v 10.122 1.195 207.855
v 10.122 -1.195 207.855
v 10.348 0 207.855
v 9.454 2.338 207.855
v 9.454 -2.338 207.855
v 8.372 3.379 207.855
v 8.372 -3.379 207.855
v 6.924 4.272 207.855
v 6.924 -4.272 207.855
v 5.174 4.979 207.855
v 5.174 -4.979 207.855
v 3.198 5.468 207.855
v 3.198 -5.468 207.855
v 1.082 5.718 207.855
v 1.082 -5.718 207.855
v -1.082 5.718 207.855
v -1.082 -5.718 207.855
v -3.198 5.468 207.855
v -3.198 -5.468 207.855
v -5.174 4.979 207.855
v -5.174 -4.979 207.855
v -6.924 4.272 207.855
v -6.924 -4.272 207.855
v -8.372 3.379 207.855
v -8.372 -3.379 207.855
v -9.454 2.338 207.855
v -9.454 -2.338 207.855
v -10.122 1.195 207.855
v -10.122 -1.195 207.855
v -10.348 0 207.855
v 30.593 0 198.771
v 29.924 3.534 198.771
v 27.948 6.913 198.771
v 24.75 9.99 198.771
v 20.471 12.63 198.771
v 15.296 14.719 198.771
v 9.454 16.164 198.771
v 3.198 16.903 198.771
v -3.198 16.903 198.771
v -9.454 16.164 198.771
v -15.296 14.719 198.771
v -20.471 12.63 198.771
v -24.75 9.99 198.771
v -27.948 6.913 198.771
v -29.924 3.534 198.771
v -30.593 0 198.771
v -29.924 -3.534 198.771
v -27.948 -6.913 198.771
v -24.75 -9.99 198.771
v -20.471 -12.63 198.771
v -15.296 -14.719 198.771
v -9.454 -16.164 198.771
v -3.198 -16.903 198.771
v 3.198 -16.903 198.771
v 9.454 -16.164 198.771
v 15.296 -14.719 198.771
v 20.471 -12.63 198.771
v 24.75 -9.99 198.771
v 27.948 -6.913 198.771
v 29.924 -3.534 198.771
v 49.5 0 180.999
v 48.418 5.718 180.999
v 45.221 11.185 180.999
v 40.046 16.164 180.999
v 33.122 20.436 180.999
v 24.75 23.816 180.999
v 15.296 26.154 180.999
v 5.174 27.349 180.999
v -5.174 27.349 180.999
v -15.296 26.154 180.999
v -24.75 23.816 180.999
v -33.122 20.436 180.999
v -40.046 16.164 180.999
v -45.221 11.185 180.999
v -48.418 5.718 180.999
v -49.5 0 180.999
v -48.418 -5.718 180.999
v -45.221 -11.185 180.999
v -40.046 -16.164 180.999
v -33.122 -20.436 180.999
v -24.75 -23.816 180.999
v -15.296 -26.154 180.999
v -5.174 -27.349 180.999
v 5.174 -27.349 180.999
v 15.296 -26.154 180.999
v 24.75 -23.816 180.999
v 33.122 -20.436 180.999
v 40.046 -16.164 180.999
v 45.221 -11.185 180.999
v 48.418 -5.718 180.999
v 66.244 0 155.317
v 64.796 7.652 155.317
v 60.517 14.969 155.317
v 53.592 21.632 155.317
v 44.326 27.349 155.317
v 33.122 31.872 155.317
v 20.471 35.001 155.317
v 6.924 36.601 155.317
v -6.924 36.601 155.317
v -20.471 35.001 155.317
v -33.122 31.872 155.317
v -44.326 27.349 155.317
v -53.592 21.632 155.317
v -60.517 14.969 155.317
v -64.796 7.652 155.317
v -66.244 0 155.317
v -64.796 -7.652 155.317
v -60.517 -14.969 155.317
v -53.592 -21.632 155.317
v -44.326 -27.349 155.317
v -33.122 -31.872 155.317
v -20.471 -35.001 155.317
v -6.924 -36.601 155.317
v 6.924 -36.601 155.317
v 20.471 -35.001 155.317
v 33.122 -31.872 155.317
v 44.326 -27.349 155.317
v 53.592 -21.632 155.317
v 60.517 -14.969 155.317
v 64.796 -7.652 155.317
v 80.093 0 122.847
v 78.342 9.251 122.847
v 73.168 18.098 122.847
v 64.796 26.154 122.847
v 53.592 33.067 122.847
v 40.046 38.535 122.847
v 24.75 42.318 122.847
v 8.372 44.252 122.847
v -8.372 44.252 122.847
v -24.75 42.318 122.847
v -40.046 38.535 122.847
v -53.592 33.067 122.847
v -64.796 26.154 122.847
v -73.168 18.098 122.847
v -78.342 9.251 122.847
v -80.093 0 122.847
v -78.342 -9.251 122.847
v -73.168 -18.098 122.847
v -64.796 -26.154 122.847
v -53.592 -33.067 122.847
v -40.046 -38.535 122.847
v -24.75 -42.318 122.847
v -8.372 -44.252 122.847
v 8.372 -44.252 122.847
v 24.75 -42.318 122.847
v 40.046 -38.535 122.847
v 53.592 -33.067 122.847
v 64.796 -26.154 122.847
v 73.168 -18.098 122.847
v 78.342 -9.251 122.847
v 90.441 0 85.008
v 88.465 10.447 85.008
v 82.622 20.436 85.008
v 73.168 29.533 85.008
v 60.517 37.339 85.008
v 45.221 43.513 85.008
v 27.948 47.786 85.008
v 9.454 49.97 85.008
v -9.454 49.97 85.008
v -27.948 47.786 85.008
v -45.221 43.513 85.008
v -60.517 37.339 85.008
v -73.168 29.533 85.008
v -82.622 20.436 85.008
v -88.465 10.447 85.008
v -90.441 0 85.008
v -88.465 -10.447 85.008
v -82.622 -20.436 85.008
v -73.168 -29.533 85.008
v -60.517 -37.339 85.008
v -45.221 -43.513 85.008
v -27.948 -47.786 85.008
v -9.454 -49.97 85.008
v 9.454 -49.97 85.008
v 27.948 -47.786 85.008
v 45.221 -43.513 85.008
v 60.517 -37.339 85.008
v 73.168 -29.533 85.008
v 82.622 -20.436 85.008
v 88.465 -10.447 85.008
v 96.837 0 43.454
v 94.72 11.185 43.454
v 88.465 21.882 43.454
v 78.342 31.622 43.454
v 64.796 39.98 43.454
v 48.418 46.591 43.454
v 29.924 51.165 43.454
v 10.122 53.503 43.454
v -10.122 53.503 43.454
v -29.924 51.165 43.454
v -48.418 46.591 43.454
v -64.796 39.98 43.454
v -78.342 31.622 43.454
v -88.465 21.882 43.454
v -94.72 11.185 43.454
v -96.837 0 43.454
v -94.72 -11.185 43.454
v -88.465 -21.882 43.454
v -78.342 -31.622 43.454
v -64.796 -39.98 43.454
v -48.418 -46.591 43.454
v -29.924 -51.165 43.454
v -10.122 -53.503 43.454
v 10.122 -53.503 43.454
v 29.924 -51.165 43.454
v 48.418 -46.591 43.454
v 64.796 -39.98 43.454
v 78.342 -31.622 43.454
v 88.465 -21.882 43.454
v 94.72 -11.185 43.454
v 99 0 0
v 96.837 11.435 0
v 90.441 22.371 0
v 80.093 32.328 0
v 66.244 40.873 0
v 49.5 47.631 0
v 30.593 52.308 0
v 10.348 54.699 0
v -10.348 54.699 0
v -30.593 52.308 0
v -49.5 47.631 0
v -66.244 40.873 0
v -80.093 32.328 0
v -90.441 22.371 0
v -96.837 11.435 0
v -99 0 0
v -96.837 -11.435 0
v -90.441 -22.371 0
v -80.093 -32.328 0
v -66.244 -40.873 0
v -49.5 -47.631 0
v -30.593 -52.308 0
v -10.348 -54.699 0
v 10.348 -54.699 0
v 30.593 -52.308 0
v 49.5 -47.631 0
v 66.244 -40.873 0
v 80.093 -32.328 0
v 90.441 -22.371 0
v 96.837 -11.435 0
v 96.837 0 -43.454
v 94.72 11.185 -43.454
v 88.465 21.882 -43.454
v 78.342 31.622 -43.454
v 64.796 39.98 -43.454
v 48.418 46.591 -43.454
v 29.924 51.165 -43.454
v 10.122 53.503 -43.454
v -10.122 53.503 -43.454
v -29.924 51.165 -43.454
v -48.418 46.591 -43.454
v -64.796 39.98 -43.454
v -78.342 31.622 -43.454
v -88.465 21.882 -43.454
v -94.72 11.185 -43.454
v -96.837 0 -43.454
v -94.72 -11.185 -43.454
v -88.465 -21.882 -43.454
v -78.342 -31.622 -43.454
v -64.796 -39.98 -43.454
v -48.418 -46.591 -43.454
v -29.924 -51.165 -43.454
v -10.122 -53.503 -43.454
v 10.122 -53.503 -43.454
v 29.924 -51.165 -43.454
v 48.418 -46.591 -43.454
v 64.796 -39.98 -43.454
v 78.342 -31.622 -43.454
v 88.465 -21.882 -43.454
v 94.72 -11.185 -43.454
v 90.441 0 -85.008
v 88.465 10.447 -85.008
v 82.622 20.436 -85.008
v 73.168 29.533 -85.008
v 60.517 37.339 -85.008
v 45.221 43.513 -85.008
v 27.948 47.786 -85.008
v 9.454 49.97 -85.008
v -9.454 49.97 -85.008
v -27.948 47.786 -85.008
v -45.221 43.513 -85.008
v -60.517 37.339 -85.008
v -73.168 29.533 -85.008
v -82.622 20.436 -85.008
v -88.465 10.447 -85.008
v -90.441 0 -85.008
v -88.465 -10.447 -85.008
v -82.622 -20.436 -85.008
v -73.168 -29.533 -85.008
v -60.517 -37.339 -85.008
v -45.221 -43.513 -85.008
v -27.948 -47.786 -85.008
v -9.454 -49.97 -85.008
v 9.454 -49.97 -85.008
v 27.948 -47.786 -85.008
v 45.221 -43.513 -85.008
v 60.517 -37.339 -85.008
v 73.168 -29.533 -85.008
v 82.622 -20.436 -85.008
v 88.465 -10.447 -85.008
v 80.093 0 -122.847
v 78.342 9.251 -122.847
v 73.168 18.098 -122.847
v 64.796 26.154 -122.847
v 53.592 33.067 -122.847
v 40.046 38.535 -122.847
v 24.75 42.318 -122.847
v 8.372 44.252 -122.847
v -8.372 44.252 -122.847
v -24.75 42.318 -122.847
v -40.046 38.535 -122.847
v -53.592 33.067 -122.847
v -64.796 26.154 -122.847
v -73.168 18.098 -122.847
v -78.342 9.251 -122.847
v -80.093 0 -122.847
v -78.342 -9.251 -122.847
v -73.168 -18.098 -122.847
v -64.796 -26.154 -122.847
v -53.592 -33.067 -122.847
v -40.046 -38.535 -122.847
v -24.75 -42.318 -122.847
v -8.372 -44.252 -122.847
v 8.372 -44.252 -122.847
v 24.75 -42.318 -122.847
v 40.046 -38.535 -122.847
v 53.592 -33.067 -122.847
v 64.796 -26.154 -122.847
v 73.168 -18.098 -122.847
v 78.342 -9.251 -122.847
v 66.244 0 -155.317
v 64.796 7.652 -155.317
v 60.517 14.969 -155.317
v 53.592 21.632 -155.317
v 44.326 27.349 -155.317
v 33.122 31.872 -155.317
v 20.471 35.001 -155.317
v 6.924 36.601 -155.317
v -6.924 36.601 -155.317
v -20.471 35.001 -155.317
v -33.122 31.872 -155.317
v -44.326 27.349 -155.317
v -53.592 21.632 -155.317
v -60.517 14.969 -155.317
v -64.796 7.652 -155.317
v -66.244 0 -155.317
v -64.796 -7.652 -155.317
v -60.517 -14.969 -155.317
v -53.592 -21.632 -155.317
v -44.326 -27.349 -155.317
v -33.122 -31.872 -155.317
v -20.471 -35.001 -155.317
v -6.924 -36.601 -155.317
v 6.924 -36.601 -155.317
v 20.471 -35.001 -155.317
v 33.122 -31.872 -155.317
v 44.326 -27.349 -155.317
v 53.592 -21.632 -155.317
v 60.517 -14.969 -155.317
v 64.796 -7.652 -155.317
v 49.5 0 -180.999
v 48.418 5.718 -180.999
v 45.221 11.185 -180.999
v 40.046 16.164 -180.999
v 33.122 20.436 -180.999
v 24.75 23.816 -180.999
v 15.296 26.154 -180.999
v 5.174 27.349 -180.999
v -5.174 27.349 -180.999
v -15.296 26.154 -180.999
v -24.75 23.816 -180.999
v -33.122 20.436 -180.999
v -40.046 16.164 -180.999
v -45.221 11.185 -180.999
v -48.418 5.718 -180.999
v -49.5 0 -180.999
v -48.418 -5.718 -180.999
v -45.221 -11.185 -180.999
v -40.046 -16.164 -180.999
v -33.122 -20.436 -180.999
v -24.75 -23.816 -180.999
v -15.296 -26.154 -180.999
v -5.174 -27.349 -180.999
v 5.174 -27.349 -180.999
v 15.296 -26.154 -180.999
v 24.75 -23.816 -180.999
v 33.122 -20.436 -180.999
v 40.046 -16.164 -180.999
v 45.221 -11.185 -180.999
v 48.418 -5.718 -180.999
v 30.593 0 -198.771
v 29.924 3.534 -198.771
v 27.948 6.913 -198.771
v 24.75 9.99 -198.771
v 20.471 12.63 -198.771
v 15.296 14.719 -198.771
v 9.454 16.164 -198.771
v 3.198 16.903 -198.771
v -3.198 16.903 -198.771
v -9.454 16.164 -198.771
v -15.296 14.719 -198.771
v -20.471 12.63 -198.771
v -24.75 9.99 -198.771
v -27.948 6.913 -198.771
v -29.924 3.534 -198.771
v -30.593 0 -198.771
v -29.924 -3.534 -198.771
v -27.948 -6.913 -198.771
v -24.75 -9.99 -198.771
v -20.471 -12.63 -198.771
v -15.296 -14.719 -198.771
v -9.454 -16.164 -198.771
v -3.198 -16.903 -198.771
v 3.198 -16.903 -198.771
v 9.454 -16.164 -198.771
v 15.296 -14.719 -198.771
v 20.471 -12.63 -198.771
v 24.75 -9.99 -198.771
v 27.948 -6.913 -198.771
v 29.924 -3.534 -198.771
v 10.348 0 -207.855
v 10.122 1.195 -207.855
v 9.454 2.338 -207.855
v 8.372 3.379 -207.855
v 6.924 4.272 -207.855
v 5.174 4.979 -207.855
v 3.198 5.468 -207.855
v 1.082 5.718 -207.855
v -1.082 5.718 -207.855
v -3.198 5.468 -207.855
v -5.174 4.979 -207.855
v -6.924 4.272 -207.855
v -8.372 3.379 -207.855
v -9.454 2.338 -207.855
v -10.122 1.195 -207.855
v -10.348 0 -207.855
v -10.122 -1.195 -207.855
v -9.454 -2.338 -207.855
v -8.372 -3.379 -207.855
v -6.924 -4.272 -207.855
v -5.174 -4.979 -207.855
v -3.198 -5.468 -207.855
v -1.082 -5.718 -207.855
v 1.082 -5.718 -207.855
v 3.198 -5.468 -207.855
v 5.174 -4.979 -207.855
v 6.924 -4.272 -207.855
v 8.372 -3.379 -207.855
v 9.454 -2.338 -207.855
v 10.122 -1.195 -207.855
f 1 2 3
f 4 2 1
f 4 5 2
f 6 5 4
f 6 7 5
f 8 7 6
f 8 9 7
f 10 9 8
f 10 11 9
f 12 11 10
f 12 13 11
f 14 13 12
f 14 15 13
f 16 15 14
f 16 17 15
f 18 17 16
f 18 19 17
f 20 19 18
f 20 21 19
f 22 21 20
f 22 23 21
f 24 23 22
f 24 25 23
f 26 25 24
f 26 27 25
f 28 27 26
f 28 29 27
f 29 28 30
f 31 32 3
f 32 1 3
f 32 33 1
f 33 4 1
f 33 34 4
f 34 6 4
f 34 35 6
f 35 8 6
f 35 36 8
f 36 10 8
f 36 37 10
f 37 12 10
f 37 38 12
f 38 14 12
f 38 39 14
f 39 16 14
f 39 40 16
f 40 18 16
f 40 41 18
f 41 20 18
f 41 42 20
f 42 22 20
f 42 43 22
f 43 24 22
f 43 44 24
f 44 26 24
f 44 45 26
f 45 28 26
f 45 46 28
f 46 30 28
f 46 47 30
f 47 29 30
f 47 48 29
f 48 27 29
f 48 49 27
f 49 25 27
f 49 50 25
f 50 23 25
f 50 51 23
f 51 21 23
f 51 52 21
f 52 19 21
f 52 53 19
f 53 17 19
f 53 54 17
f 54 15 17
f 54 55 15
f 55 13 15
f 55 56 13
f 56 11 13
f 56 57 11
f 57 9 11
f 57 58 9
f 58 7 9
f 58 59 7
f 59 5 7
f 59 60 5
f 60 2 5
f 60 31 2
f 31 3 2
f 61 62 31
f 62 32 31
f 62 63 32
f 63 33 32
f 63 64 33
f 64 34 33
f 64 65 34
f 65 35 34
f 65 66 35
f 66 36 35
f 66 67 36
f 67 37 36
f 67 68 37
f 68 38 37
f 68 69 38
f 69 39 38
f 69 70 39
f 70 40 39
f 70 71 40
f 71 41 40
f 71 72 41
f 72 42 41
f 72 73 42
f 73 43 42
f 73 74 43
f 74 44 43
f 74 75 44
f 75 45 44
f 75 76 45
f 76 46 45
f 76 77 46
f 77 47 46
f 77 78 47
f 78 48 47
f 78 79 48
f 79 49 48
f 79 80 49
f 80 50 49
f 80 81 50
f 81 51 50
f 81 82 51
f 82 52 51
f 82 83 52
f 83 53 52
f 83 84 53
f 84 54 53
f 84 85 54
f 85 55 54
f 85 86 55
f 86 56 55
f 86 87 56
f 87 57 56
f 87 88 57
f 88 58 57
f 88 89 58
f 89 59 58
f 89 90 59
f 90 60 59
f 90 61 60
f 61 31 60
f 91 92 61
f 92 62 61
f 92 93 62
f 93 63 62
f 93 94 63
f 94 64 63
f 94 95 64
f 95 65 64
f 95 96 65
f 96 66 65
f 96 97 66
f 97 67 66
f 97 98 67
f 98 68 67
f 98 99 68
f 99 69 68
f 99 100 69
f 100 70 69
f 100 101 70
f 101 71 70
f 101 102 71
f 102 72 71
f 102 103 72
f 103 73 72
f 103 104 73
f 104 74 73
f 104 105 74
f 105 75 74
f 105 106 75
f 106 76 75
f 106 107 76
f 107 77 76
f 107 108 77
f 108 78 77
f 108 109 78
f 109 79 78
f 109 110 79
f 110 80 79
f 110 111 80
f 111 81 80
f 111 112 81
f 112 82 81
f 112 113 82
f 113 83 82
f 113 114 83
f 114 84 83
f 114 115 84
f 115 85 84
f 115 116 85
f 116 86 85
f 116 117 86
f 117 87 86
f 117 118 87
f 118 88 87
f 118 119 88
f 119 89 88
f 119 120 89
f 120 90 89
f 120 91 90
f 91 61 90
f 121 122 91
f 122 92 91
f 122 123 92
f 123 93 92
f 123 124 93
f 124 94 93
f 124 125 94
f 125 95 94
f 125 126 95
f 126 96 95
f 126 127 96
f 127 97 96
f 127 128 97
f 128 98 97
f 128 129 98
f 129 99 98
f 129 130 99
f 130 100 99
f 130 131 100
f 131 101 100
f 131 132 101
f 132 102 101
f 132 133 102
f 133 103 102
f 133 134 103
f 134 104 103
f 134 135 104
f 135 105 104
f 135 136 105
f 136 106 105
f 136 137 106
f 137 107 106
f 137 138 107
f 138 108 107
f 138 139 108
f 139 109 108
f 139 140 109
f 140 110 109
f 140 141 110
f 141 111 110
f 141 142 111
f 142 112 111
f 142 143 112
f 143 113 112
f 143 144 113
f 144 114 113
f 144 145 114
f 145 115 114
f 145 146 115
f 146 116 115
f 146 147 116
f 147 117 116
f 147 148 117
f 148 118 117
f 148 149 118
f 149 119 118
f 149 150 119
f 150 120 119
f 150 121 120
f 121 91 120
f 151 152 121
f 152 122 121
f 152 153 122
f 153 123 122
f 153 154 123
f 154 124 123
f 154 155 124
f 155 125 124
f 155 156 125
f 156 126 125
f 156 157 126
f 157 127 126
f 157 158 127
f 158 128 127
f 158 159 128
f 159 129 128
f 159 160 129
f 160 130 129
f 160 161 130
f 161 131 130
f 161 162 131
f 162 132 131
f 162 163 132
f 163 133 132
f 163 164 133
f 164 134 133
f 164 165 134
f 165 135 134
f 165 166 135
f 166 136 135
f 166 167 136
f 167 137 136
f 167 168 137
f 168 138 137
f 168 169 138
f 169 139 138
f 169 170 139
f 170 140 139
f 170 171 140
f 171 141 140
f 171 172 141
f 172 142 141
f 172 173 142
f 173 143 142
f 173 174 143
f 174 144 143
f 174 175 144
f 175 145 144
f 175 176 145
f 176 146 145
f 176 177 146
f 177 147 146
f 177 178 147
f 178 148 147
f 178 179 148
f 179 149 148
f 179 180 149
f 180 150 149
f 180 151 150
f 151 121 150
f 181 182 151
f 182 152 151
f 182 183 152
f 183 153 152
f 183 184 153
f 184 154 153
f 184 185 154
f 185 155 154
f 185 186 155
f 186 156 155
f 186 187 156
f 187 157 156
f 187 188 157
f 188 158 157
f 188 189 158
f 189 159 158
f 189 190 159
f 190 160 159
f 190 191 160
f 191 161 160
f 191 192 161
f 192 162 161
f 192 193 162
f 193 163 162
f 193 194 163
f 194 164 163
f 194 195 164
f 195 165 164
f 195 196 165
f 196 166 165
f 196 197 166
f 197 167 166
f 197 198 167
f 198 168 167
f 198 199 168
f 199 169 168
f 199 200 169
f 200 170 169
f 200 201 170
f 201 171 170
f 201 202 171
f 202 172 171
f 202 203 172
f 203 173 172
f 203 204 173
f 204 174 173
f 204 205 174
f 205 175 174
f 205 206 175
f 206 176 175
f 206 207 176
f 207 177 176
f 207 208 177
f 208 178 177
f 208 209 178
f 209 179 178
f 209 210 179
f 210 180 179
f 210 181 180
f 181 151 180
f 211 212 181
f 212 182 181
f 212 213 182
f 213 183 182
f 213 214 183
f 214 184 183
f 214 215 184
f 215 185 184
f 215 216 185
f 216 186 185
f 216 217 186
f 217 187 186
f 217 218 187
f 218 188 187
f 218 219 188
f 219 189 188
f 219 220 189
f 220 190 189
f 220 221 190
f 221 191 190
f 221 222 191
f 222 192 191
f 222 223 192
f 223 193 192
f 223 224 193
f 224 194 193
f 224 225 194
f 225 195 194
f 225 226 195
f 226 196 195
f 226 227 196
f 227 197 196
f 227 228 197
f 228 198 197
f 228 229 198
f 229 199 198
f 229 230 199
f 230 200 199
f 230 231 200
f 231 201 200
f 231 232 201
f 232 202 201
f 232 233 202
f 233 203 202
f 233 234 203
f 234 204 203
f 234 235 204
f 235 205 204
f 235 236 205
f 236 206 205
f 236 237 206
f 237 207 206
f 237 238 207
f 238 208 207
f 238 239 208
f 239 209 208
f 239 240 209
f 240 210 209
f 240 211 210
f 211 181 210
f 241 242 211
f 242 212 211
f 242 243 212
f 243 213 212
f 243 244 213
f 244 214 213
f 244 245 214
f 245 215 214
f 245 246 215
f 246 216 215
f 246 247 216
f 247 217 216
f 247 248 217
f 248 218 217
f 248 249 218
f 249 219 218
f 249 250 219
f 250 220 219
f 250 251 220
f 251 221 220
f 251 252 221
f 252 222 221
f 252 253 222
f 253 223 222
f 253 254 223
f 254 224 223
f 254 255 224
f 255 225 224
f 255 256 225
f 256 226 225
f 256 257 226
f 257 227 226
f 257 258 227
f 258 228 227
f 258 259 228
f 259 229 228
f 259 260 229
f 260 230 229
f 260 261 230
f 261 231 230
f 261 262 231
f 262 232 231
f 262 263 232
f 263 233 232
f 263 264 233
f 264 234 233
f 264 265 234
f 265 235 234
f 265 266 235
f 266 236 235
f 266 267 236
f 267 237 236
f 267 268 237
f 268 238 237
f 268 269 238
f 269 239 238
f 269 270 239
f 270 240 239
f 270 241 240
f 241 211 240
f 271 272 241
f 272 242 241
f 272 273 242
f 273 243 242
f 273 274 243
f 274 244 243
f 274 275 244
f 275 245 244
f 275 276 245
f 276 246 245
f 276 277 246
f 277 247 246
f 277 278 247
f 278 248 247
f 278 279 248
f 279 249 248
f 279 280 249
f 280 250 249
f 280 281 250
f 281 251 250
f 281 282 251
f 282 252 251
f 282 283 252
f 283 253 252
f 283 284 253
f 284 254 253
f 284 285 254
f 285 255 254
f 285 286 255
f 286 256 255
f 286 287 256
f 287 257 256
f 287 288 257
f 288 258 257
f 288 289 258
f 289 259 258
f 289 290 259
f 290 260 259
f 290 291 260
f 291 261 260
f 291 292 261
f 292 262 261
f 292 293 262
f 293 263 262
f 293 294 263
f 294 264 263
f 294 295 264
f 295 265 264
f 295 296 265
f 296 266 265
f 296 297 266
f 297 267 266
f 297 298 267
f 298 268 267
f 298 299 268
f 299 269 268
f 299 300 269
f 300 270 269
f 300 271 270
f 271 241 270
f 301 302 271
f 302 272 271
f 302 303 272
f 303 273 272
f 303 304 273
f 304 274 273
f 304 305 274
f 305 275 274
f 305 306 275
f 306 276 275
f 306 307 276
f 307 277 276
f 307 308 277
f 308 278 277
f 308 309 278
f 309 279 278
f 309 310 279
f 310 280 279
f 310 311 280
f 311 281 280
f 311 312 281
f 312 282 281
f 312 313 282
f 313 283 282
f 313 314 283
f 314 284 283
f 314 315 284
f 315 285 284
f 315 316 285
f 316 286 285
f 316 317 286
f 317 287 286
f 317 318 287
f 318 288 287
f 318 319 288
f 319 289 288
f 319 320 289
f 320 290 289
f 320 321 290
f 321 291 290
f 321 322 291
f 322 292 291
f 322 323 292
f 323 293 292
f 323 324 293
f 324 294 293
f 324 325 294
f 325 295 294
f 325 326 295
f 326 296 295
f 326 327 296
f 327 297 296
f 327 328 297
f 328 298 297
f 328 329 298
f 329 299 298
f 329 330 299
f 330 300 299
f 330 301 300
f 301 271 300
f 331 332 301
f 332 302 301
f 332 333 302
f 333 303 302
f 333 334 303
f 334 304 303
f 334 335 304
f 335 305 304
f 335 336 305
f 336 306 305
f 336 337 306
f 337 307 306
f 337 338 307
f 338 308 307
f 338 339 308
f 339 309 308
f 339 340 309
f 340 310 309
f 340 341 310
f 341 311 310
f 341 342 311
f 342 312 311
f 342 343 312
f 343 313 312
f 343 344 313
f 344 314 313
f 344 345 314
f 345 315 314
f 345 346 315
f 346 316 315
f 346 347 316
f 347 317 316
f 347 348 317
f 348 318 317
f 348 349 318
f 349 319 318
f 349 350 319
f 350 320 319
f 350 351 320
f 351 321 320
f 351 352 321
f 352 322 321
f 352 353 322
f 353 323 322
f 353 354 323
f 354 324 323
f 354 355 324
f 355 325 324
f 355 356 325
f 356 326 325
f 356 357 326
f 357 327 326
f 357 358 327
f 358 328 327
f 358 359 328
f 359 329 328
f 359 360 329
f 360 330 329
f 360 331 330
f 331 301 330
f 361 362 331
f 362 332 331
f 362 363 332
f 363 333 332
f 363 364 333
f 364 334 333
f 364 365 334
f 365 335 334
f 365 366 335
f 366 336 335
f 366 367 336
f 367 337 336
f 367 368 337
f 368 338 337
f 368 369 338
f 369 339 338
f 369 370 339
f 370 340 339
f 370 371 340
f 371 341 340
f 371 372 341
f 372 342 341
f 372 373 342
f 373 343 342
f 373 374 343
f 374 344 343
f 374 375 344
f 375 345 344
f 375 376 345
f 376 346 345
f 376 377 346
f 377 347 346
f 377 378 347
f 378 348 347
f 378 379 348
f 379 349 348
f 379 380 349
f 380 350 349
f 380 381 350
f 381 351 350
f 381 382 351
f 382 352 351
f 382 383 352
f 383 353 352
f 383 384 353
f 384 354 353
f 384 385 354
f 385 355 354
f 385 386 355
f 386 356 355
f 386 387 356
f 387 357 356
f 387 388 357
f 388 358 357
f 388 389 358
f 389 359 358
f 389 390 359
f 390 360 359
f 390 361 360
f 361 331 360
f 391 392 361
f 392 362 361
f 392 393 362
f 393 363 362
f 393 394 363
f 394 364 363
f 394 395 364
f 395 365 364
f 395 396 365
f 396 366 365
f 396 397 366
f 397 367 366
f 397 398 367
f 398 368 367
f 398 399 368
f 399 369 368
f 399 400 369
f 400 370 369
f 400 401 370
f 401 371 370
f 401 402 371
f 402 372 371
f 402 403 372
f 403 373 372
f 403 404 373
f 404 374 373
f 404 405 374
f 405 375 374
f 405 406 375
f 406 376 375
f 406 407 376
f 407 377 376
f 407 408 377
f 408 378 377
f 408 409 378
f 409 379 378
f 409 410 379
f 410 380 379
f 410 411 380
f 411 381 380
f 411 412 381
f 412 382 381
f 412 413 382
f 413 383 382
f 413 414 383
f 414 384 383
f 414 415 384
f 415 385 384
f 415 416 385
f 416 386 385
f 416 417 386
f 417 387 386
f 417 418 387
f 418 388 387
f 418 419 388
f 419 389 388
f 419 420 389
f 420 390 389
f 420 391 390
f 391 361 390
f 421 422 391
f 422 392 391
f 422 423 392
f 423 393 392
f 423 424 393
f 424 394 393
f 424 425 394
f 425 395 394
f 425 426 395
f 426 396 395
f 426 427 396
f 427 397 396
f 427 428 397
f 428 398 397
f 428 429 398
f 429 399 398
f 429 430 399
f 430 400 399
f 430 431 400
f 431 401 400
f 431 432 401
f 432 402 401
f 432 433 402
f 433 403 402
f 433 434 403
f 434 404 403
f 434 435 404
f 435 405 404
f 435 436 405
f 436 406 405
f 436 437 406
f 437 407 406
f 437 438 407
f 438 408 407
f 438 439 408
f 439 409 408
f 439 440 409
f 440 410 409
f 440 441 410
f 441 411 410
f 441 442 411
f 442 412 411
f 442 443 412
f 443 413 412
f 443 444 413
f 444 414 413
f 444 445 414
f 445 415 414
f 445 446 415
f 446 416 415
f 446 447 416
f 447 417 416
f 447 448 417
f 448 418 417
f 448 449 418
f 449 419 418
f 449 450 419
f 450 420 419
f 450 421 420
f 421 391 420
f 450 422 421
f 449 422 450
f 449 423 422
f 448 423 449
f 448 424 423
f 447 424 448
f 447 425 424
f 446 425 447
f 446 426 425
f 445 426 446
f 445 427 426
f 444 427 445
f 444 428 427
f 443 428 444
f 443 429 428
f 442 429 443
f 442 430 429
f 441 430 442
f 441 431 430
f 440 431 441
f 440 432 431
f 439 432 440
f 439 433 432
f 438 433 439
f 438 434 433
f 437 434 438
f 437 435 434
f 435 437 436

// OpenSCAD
// Generated by SolidPython 1.0.1 on 2020-07-29 00:46:48


scale(v = [9, 5, 19]) {
	sphere(r = 11);
}
/***********************************************
*********      SolidPython code:      **********
************************************************
 
# import packages: SolidPython
from solid import *
from solid.utils import *
from itertools import chain, combinations, permutations


class Resize:

    def __init__(self, scad_file):
        self.scad_file = scad_file
        #self.scad_file = import_scad(scad_file)
        # cone/cylinder param:
        self.r1 = 0
        self.r2 = 0
        self.h = 0
        # rectangular prism param:
        self.w = 0
        self.l = 0
        # ellipse param:
        self.r = 0

    # import OpenScad code (file name corresponds to shape)


    # classify shape + parameters
    def assign(self, param1, param2, param3):
        if self.scad_file == 'cone.scad':
            self.r1 = param1
            self.r2 = param2
            self.h = param3
        elif self.scad_file == 'cylinder.scad':
            self.r1 = param1
            self.r2 = param2
            self.h = param3
        elif self.scad_file == 'rectangularPrism.scad':
            self.h = param1
            self.l = param2
            self.w = param3
        else:
            self.r = param1
            self.h = param2

    # resize parameters
    def iterate(self):
        x = range(3, 20, 2)
        i = 1
        if self.scad_file == 'cone.scad':
            tempList = list(permutations(x, 2))
            for temp in tempList:
                param1 = temp[0]
                param2 = temp[1]
                filepath = 'produced_scad_files/' + 'cone' + str(param1) + '_' + str(param2) + '_' + '.scad'
                scad_render_to_file(cylinder(h=param1, r1=param2, r2=0), filepath)

        elif self.scad_file == 'cylinder.scad':
            tempList = list(permutations(x, 3))
            for temp in tempList:
                param1 = temp[0]
                param2 = temp[1]
                filepath = 'produced_scad_files/' + 'cylinder' + str(param1) + '_' + str(param2) + '_' + '.scad'
                scad_render_to_file(cylinder(h=param1, r1=param2, r2=param2), filepath)

        elif self.scad_file == 'rectangularPrism.scad':
            tempList = list(permutations(x, 3))
            for temp in tempList:
                param1 = temp[0]
                param2 = temp[1]
                param3 = temp[2]
                filepath = 'produced_scad_files/' + 'rectangularPrism' + str(param1) + '_' + str(param2) + '_' + str(
                    param3) + '.scad'
                scad_render_to_file(cube(size=(param1, param2, param3)), filepath)

        elif self.scad_file == 'ellipse.scad':
            tempList = list(permutations(x, 4))
            for temp in tempList:
                param1 = temp[0]
                param2 = temp[1]
                param3 = temp[2]
                param4 = temp[3]
                filepath = 'produced_scad_files/' + 'ellipse' + str(param1) + '_' + str(param2) + '_' + str(param3) + '_' + str(param4) + '.scad'
                scad_render_to_file(scale([param1, param2, param3])(sphere(r=param4)), filepath)

    def render_to_scadfile(self):
        scad_render_to_file(scad, 'example.scad') 
 
************************************************/
